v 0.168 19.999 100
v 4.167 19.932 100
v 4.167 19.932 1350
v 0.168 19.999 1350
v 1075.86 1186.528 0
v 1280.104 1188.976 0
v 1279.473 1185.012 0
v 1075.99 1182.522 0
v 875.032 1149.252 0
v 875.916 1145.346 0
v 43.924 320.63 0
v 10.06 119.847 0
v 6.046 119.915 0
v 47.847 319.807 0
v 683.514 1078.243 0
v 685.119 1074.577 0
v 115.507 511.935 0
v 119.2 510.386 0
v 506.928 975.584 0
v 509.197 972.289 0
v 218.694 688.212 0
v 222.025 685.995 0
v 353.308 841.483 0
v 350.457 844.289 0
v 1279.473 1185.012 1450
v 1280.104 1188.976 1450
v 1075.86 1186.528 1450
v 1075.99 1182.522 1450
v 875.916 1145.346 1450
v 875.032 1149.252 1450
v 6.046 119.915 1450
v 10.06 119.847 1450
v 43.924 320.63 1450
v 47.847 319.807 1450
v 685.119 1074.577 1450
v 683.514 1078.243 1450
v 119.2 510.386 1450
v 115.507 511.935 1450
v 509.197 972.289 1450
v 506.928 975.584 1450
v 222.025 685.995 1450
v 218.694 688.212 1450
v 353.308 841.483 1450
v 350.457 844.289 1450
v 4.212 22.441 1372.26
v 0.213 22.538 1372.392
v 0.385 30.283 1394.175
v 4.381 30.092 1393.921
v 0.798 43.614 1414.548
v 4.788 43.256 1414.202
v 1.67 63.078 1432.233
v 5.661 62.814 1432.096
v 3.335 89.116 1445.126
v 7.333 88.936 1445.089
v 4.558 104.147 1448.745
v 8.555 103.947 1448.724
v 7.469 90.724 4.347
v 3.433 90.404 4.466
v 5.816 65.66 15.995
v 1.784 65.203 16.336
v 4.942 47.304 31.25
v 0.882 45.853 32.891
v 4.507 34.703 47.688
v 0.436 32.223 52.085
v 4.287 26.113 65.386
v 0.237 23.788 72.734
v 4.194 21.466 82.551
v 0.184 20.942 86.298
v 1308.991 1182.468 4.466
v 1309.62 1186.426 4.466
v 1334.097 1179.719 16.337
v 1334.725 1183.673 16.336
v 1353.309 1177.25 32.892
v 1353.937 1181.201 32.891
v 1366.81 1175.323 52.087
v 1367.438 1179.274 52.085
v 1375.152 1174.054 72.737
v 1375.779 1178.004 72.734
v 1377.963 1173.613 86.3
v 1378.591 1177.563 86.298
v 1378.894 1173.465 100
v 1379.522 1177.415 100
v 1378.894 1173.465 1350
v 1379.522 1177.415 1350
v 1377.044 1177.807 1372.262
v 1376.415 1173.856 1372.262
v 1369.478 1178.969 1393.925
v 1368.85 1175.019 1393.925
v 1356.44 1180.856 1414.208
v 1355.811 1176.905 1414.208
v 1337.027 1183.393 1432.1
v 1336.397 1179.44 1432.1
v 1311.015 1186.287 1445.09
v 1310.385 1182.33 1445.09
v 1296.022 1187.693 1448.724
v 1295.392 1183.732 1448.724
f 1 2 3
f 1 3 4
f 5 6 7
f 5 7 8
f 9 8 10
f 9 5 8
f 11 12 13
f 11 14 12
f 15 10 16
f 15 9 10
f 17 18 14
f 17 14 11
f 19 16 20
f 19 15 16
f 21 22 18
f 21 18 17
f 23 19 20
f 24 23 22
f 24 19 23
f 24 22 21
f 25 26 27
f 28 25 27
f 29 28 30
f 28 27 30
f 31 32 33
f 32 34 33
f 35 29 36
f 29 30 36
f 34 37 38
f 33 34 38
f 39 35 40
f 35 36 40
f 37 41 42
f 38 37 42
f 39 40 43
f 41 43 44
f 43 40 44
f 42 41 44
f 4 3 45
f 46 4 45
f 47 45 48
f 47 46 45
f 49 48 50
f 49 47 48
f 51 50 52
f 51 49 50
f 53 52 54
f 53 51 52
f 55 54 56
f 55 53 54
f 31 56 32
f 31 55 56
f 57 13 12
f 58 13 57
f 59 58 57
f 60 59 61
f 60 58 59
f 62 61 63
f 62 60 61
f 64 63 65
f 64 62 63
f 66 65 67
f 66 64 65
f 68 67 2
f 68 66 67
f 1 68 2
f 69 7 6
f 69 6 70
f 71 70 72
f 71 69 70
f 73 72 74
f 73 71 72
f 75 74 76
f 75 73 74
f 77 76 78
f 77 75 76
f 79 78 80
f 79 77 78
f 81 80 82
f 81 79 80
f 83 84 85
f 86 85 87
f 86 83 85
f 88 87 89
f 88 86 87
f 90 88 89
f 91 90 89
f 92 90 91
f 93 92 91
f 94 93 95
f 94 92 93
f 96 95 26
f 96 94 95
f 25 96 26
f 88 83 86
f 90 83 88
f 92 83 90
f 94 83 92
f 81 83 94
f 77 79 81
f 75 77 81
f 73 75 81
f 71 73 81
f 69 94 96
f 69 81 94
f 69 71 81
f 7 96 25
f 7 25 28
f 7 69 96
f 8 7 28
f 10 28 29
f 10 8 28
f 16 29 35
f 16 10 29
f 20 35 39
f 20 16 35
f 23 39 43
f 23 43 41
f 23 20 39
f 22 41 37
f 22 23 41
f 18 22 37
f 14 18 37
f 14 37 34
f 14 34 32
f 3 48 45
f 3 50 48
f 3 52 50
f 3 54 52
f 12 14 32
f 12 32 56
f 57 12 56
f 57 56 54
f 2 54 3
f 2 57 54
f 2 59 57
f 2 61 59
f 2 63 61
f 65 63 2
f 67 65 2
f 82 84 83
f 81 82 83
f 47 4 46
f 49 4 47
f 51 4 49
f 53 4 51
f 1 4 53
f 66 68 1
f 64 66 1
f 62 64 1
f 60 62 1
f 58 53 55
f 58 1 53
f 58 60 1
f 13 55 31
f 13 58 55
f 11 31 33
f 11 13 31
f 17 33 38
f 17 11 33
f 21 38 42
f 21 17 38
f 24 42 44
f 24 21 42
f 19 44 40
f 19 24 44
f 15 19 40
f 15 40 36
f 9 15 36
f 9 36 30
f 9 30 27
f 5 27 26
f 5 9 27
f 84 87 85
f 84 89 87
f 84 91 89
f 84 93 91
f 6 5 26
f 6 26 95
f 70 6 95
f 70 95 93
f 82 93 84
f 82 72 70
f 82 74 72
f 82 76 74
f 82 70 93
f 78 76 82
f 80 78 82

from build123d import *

# Parameters (mm, degrees)
BOSS_EXTRUDE1_DEPTH = 1450
FILLET1_START       = -1
FILLET1_DEPTH       = 10
FILLET1_START_2     = 1370
FILLET1_2_DEPTH     = 11


with BuildPart() as part:
    # Sketch1 → Boss-Extrude1 (new body)
    with BuildSketch(Plane.XY):
        with BuildLine():
            Line((1379.522237955, 1177.41513497), (1378.893822938, 1173.464806558))
            ThreePointArc((1378.893822938, 1173.464806558), (428.446906418, 910.229328203), (4.167191444, 19.932197101))
            Line((4.167191444, 19.932197101), (0.167754274, 19.99929645))
            ThreePointArc((0.167754274, 19.99929645), (425.87575598, 913.293505975), (1379.522237955, 1177.41513497))
        make_face()
    extrude(amount=BOSS_EXTRUDE1_DEPTH)

    # Fillet1: read off the stored shape, not the designer's step
    # Fillet1 outline → Fillet1 (cut)
    with BuildSketch(Plane(origin=(0, 0, 0), x_dir=(0.016774837236560897, 0.9998592925185458, 0), z_dir=(0.9998592925185458, -0.016774837236560897, 0)).offset(FILLET1_START)):
        with BuildLine():
            ThreePointArc((119.99929645, 0), (49.288618332, 29.289321882), (19.99929645, 100))
            Line((19.99929645, 100), (19.99929645, 0))
            Line((19.99929645, 0), (119.99929645, 0))
        make_face()
        with BuildLine():
            ThreePointArc((19.99929645, 1350), (49.288618331, 1420.710678119), (119.99929645, 1450))
            Line((119.99929645, 1450), (19.99929645, 1450))
            Line((19.99929645, 1450), (19.99929645, 1350))
        make_face()
    extrude(amount=FILLET1_DEPTH, mode=Mode.SUBTRACT)

    # Fillet1 2 outline → Fillet1 2 (cut)
    with BuildSketch(Plane(origin=(0, 0, 0), x_dir=(0.9875821031103624, -0.15710375430305096, 0), z_dir=(0.15710375430305093, 0.9875821031103625, 0)).offset(FILLET1_START_2)):
        with BuildLine():
            Line((1177.41513497, 0), (1077.41513497, 0))
            ThreePointArc((1077.41513497, 0), (1148.125813089, -29.289321881), (1177.41513497, -100))
            Line((1177.41513497, -100), (1177.41513497, 0))
        make_face()
        with BuildLine():
            Line((1177.41513497, -1450), (1177.41513497, -1350))
            ThreePointArc((1177.41513497, -1350), (1148.125813089, -1420.710678119), (1077.41513497, -1450))
            Line((1077.41513497, -1450), (1177.41513497, -1450))
        make_face()
    extrude(amount=FILLET1_2_DEPTH, mode=Mode.SUBTRACT)


solid = part.part
